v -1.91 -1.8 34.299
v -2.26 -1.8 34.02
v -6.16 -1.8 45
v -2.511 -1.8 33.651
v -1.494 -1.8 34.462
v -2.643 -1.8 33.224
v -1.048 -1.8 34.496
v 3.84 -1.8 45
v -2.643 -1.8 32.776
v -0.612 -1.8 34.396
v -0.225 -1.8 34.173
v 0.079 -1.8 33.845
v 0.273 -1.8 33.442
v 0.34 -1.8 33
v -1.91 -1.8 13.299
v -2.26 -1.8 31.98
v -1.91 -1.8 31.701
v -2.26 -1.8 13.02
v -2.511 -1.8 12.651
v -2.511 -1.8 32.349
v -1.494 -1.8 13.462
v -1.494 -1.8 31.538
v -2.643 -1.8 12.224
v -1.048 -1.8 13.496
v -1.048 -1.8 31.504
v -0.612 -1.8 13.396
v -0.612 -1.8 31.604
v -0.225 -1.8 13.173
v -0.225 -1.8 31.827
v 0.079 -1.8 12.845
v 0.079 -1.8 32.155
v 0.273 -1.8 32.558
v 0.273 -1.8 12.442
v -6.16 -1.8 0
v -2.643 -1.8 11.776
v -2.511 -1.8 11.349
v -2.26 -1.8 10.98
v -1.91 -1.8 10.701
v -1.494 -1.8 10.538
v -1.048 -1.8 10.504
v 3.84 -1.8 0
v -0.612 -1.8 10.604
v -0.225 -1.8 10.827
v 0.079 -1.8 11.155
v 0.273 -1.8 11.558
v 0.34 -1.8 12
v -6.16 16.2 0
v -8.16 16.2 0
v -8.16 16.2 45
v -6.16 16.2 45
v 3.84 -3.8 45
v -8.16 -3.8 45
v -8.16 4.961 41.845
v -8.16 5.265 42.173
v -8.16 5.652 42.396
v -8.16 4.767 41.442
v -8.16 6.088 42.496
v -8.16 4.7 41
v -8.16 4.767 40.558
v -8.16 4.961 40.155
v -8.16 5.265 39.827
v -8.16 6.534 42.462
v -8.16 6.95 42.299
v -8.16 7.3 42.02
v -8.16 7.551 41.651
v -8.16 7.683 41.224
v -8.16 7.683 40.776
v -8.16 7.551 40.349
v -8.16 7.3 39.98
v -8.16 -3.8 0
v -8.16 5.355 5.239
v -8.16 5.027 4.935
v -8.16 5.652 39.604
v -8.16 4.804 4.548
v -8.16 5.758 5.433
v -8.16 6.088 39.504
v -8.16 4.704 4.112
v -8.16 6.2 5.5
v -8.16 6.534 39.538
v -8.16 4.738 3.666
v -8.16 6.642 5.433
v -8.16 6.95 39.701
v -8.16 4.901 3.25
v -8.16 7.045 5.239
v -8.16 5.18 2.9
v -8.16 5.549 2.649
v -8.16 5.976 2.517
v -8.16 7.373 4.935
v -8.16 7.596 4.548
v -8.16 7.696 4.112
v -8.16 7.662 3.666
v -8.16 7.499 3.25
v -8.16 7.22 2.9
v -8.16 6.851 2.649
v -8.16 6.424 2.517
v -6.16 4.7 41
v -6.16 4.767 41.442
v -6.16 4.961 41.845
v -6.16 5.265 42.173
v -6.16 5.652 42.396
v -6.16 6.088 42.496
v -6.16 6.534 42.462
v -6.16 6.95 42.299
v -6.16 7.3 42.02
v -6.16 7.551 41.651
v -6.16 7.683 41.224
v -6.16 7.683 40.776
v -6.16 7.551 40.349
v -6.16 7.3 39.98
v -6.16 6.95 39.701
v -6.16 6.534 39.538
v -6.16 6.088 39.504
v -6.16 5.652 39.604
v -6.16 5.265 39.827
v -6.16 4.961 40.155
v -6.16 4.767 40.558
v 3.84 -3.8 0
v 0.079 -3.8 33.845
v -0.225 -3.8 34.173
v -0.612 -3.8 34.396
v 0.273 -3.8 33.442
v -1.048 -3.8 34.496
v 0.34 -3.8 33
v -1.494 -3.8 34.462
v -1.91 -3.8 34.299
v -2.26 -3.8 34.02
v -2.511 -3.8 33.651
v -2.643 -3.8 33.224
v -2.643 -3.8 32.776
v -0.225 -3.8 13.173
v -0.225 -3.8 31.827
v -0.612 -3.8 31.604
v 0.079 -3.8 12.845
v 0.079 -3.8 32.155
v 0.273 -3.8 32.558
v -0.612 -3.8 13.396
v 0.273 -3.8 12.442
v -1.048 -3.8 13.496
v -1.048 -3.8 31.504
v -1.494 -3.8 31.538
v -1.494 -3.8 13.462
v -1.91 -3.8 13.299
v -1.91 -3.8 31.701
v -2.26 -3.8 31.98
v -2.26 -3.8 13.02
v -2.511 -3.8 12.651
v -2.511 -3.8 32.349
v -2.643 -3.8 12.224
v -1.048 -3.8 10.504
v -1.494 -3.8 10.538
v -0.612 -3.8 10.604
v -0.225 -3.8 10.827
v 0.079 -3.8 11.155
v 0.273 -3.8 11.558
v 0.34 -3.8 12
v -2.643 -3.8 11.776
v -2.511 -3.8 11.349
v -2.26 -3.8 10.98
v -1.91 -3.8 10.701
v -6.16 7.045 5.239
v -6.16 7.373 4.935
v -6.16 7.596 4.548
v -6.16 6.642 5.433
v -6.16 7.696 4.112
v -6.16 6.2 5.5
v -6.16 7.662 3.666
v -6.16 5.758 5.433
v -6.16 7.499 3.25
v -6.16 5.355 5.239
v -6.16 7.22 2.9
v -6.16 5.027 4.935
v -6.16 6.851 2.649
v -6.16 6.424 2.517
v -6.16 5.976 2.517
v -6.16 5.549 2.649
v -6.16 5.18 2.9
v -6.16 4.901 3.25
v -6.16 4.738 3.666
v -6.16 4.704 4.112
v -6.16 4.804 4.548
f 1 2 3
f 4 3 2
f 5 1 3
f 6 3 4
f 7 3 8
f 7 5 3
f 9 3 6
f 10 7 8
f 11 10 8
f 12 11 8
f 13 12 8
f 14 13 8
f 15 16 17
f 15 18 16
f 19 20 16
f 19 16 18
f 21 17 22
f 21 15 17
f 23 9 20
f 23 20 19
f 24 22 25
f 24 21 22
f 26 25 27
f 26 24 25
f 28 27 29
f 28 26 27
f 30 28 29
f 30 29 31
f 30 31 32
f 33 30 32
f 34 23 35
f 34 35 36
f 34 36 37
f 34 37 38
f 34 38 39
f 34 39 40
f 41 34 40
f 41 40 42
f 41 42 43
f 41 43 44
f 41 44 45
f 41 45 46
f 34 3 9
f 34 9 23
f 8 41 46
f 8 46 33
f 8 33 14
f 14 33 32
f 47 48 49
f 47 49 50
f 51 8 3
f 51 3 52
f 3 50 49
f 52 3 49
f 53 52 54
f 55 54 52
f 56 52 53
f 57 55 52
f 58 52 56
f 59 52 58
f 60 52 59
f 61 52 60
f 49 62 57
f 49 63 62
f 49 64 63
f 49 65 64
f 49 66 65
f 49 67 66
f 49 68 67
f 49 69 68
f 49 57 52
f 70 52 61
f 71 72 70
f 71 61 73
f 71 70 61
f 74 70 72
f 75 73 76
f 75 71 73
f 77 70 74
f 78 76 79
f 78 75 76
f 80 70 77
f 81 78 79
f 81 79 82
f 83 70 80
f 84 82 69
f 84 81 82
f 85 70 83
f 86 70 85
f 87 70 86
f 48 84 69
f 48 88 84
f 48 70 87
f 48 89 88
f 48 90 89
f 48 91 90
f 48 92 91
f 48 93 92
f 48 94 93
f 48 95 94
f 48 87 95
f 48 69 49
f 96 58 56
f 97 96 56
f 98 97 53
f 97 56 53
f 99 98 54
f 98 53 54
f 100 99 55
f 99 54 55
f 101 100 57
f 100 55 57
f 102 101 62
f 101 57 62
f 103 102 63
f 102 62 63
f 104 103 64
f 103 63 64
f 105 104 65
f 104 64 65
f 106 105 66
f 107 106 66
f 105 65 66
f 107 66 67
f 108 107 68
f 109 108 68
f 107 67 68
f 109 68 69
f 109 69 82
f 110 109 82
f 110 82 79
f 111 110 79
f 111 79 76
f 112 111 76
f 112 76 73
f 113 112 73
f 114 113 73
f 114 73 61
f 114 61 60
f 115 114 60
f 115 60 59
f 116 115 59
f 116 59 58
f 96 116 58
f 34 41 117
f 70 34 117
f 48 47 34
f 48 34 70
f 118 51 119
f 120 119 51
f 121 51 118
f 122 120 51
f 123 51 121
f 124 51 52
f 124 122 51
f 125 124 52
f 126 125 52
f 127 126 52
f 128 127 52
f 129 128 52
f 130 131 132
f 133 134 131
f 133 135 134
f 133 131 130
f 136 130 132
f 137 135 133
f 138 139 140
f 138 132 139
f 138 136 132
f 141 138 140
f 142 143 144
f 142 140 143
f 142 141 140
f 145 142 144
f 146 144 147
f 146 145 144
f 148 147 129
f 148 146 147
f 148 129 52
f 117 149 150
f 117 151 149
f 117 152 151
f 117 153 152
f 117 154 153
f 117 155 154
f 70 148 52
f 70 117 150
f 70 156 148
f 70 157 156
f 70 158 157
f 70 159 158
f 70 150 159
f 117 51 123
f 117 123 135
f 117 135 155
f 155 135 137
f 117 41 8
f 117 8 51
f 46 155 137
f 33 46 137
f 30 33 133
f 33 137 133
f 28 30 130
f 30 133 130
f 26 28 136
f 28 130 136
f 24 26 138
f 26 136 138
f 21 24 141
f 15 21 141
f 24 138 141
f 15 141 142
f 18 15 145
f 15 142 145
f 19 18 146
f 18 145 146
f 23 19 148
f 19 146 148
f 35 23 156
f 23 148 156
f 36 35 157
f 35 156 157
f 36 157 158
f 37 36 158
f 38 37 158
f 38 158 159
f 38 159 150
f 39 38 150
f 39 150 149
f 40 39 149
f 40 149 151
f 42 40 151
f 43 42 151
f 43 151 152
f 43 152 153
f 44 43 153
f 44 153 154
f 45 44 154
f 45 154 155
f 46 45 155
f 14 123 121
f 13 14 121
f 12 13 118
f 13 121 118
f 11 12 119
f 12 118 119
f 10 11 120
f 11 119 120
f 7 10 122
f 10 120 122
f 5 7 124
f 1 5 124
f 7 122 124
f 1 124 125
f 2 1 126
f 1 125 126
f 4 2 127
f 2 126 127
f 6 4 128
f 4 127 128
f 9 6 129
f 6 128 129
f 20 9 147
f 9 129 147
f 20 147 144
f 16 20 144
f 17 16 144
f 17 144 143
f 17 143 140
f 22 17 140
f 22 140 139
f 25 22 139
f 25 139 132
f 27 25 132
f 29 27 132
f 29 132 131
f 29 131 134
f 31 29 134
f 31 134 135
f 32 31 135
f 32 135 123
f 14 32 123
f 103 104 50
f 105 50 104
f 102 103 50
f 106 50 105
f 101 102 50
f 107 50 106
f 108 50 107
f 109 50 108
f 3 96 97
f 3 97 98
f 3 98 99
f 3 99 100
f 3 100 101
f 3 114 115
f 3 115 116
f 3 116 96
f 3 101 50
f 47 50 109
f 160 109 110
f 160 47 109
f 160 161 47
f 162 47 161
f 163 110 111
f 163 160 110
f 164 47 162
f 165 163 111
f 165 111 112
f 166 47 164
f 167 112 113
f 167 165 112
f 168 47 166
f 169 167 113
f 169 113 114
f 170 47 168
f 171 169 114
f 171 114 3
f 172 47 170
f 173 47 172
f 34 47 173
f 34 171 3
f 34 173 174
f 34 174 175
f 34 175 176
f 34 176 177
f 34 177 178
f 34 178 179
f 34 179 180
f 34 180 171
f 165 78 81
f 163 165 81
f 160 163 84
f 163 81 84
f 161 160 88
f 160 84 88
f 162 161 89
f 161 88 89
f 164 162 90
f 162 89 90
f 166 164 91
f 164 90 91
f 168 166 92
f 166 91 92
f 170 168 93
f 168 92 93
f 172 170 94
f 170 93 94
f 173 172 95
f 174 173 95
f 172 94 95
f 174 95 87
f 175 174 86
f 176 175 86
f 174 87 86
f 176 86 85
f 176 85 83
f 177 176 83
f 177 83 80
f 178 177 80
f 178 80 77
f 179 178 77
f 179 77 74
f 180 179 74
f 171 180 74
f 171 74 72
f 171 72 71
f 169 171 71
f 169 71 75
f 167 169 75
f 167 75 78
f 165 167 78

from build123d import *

# Parameters (mm, degrees)
EXTRUDE_1_DEPTH     = 45
SKETCH_2_R          = 1.5
CUT_EXTRUDE_1_DEPTH = 50.309633947
SKETCH_3_R          = 1.5
CUT_EXTRUDE_2_DEPTH = 50.915785078


with BuildPart() as part:
    # 草图1 → 凸台-拉伸1 (new body)
    with BuildSketch(Plane.XY):
        Polygon((-8.16, 16.2), (-6.16, 16.2), (-6.16, -1.8), (3.84, -1.8), (3.84, -3.8), (-8.16, -3.8), align=None)
    extrude(amount=EXTRUDE_1_DEPTH)

    # 草图2 → 切除-拉伸1 (cut, through all)
    with BuildSketch(Plane.ZY.offset(8.16)):
        with Locations((4, 6.2)):
            Circle(SKETCH_2_R)
        with Locations(Location((41, 6.2, 0), (0, 0, 270))):
            Circle(SKETCH_2_R)
    extrude(amount=-CUT_EXTRUDE_1_DEPTH, mode=Mode.SUBTRACT)

    # 草图3 → 切除-拉伸2 (cut, through all)
    with BuildSketch(Plane.XZ.offset(3.8)):
        with Locations((-1.16, 33)):
            Circle(SKETCH_3_R)
        with Locations((-1.16, 12)):
            Circle(SKETCH_3_R)
    extrude(amount=-CUT_EXTRUDE_2_DEPTH, mode=Mode.SUBTRACT)


solid = part.part
